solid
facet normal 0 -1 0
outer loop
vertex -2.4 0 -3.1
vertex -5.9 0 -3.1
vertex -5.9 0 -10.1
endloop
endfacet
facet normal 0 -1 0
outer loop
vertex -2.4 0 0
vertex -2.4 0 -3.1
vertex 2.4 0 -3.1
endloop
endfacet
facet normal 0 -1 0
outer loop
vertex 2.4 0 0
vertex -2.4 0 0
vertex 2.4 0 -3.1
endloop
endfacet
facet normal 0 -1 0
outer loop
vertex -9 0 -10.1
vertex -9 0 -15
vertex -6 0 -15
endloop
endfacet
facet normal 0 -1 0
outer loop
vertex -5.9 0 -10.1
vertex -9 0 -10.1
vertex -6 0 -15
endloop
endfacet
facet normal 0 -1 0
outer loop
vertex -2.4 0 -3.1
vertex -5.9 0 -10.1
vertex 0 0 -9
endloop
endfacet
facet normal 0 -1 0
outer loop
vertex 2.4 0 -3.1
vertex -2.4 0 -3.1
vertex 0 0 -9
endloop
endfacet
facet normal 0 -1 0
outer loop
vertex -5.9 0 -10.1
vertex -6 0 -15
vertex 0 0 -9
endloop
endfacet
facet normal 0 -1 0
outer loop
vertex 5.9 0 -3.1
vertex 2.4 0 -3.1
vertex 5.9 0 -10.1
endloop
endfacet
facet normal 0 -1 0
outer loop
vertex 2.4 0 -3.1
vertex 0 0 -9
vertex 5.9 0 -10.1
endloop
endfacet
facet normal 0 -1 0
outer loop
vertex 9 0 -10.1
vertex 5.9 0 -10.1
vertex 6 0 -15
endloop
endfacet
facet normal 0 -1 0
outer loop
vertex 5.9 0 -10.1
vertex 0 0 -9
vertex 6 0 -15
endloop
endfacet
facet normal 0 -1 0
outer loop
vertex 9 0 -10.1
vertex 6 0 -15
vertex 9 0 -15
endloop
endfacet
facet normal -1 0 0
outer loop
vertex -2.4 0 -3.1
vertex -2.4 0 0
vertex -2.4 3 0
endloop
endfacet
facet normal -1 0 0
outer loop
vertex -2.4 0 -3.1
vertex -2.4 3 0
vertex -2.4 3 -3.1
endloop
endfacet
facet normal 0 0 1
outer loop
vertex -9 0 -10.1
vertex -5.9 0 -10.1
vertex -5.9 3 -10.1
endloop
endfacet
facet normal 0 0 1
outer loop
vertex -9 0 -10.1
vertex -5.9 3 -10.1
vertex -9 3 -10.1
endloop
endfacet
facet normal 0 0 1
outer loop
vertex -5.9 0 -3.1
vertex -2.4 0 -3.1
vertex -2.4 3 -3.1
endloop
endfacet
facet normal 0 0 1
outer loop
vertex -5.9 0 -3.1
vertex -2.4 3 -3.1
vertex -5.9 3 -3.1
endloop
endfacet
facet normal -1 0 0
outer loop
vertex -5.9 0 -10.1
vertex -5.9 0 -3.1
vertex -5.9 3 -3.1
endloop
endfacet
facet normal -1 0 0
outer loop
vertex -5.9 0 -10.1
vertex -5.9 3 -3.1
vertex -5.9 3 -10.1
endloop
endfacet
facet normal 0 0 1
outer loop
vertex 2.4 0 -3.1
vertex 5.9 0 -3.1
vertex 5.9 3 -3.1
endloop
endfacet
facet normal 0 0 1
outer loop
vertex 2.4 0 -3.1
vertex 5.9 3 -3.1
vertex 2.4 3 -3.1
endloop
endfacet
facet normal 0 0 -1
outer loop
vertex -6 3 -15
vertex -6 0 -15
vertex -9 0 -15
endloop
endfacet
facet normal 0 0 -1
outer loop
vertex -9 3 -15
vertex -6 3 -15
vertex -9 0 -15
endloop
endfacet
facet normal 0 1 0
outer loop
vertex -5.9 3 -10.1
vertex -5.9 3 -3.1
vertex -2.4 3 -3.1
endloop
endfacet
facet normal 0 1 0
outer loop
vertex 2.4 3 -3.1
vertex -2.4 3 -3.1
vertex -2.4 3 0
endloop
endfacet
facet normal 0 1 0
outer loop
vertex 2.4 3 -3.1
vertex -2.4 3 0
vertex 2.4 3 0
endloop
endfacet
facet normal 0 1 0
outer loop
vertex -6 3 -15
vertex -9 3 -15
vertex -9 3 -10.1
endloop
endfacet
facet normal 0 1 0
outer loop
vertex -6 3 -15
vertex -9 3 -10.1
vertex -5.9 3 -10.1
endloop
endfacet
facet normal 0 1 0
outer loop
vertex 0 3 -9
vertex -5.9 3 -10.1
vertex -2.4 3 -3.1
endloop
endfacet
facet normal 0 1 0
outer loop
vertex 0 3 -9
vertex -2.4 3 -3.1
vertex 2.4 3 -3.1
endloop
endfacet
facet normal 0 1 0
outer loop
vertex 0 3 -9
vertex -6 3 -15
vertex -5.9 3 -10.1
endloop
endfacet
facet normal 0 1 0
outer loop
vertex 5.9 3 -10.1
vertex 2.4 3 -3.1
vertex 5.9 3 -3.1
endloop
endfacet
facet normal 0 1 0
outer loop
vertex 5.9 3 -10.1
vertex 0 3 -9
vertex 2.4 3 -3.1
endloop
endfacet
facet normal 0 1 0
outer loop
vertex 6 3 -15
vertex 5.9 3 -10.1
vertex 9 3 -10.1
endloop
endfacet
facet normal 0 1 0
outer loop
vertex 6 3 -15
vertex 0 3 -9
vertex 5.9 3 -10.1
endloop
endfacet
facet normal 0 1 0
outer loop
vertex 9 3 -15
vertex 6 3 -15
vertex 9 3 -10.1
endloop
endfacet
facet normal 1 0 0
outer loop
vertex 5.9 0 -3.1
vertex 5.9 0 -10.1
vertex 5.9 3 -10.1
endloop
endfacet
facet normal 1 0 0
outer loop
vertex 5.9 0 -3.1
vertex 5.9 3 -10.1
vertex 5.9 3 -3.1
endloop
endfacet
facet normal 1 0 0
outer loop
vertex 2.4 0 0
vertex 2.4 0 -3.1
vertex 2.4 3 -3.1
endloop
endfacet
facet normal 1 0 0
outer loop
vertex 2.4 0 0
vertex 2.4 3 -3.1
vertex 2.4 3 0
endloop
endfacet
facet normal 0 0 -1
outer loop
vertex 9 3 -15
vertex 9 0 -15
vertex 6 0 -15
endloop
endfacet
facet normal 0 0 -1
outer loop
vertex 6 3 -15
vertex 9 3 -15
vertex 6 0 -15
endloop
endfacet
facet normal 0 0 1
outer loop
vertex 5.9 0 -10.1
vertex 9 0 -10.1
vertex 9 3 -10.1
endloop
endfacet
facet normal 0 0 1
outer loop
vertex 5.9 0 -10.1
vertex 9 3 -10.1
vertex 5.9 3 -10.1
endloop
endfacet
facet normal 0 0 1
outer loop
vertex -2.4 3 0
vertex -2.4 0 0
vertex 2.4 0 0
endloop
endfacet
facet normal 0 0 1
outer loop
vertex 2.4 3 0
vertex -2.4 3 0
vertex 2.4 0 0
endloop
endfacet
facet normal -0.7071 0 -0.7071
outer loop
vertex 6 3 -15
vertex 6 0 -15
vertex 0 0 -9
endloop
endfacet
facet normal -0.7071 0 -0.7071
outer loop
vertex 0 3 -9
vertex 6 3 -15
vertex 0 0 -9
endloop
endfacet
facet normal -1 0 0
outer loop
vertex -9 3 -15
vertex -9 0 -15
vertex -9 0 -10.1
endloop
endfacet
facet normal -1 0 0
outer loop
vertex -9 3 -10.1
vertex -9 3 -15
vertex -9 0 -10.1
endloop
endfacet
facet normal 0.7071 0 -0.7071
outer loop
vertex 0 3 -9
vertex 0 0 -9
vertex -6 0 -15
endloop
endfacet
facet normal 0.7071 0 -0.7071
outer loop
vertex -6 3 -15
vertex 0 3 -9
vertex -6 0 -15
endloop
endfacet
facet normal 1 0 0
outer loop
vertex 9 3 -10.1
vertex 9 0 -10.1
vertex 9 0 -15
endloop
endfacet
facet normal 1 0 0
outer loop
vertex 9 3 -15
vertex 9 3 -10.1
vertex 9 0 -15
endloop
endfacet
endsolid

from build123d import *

# Parameters (mm, degrees)
BOSS_EXTRUDE1_DEPTH = 3
CUT_EXTRUDE3_DEPTH  = 4


with BuildPart() as part:
    # Sketch1 → Boss-Extrude1 (new body)
    with BuildSketch(Plane(origin=(0, 0, 0), x_dir=(1, 0, 0), z_dir=(0, 1, 0))):
        Polygon((-6, 15), (-9, 15), (-9, 0), (9, 0), (9, 15), (6, 15), (0, 9), align=None)
    extrude(amount=BOSS_EXTRUDE1_DEPTH)

    # Sketch6 → Cut-Extrude3 (cut, through all)
    with BuildSketch(Plane(origin=(0, 0, 0), x_dir=(1, 0, 0), z_dir=(0, 1, 0))):
        Polygon((-5.9, 3.1), (-5.9, 10.1), (-9.1, 10.1), (-9.1, -0.1), (-2.4, -0.1), (-2.4, 3.1), align=None)
        Polygon((9.1, 10.1), (5.9, 10.1), (5.9, 3.1), (2.4, 3.1), (2.4, -0.1), (9.1, -0.1), align=None)
    extrude(amount=CUT_EXTRUDE3_DEPTH, mode=Mode.SUBTRACT)


solid = part.part
